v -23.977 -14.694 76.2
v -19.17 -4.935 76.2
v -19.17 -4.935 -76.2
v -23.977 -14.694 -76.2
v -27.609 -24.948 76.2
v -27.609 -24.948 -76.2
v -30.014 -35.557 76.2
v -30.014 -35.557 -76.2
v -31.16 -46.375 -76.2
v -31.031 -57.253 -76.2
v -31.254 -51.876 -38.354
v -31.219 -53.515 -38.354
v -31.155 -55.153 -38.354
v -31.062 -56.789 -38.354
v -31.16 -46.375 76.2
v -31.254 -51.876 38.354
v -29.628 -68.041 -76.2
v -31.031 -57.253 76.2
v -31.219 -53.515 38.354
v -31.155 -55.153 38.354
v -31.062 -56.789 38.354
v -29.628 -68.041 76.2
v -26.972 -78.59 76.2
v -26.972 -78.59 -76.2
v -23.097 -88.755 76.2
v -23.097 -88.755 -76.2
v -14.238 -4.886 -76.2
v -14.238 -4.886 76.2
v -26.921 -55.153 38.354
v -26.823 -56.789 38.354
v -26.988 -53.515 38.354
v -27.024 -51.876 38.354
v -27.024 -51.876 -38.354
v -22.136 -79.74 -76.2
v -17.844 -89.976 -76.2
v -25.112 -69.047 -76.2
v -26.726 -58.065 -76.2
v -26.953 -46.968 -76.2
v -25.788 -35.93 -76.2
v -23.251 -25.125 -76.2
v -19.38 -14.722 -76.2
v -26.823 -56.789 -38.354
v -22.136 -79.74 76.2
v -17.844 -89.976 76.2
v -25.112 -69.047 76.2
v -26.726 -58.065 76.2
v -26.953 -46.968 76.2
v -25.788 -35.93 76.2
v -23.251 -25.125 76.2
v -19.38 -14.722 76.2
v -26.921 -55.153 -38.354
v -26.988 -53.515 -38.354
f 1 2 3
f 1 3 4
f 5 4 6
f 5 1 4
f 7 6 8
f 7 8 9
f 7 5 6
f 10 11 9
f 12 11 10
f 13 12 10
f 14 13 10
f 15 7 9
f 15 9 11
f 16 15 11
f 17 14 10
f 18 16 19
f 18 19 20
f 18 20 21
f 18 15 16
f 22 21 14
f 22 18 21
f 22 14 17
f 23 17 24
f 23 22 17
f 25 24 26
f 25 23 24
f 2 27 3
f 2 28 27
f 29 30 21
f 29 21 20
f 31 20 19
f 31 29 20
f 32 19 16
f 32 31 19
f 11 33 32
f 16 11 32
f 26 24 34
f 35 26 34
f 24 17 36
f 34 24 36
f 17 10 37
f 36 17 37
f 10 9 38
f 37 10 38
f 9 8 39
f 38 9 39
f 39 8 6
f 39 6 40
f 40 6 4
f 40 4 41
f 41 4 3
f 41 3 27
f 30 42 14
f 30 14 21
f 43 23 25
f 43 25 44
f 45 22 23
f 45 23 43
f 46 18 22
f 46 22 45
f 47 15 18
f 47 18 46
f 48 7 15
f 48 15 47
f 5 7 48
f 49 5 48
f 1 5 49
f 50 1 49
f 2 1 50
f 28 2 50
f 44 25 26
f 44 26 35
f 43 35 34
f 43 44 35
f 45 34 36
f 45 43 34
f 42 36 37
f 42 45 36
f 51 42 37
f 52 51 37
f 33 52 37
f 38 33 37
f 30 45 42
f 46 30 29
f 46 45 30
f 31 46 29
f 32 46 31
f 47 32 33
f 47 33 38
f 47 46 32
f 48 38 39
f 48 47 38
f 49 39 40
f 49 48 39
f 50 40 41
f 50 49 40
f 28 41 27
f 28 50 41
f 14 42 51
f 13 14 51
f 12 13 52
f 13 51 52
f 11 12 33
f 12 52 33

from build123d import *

# Parameters (mm, degrees)
F1_DEPTH = 76.2
F2_W     = 4.913513
F2_H     = 76.708
F3_DEPTH = 50.8


with BuildPart() as f1:
    # F0 (on Top) → F1 (new body, symmetric)
    with BuildSketch(Plane.XY):
        with BuildLine():
            Line((-14.237757, -4.885755), (-19.169552, -4.935114))
            ThreePointArc((-19.169552, -4.935114), (-31.159886, -46.375263), (-23.097479, -88.755114))
            Line((-23.097479, -88.755114), (-17.844147, -89.975755))
            ThreePointArc((-17.844147, -89.975755), (-26.952715, -46.96828), (-14.237757, -4.885755))
        make_face()
    extrude(amount=F1_DEPTH, both=True)

    # F2 (on Right) → F3 (cut)
    with BuildSketch(Plane.YZ):
        with Locations((-54.332511, 0)):
            Rectangle(F2_W, F2_H)
    extrude(amount=-F3_DEPTH, mode=Mode.SUBTRACT)


solid = f1.part
